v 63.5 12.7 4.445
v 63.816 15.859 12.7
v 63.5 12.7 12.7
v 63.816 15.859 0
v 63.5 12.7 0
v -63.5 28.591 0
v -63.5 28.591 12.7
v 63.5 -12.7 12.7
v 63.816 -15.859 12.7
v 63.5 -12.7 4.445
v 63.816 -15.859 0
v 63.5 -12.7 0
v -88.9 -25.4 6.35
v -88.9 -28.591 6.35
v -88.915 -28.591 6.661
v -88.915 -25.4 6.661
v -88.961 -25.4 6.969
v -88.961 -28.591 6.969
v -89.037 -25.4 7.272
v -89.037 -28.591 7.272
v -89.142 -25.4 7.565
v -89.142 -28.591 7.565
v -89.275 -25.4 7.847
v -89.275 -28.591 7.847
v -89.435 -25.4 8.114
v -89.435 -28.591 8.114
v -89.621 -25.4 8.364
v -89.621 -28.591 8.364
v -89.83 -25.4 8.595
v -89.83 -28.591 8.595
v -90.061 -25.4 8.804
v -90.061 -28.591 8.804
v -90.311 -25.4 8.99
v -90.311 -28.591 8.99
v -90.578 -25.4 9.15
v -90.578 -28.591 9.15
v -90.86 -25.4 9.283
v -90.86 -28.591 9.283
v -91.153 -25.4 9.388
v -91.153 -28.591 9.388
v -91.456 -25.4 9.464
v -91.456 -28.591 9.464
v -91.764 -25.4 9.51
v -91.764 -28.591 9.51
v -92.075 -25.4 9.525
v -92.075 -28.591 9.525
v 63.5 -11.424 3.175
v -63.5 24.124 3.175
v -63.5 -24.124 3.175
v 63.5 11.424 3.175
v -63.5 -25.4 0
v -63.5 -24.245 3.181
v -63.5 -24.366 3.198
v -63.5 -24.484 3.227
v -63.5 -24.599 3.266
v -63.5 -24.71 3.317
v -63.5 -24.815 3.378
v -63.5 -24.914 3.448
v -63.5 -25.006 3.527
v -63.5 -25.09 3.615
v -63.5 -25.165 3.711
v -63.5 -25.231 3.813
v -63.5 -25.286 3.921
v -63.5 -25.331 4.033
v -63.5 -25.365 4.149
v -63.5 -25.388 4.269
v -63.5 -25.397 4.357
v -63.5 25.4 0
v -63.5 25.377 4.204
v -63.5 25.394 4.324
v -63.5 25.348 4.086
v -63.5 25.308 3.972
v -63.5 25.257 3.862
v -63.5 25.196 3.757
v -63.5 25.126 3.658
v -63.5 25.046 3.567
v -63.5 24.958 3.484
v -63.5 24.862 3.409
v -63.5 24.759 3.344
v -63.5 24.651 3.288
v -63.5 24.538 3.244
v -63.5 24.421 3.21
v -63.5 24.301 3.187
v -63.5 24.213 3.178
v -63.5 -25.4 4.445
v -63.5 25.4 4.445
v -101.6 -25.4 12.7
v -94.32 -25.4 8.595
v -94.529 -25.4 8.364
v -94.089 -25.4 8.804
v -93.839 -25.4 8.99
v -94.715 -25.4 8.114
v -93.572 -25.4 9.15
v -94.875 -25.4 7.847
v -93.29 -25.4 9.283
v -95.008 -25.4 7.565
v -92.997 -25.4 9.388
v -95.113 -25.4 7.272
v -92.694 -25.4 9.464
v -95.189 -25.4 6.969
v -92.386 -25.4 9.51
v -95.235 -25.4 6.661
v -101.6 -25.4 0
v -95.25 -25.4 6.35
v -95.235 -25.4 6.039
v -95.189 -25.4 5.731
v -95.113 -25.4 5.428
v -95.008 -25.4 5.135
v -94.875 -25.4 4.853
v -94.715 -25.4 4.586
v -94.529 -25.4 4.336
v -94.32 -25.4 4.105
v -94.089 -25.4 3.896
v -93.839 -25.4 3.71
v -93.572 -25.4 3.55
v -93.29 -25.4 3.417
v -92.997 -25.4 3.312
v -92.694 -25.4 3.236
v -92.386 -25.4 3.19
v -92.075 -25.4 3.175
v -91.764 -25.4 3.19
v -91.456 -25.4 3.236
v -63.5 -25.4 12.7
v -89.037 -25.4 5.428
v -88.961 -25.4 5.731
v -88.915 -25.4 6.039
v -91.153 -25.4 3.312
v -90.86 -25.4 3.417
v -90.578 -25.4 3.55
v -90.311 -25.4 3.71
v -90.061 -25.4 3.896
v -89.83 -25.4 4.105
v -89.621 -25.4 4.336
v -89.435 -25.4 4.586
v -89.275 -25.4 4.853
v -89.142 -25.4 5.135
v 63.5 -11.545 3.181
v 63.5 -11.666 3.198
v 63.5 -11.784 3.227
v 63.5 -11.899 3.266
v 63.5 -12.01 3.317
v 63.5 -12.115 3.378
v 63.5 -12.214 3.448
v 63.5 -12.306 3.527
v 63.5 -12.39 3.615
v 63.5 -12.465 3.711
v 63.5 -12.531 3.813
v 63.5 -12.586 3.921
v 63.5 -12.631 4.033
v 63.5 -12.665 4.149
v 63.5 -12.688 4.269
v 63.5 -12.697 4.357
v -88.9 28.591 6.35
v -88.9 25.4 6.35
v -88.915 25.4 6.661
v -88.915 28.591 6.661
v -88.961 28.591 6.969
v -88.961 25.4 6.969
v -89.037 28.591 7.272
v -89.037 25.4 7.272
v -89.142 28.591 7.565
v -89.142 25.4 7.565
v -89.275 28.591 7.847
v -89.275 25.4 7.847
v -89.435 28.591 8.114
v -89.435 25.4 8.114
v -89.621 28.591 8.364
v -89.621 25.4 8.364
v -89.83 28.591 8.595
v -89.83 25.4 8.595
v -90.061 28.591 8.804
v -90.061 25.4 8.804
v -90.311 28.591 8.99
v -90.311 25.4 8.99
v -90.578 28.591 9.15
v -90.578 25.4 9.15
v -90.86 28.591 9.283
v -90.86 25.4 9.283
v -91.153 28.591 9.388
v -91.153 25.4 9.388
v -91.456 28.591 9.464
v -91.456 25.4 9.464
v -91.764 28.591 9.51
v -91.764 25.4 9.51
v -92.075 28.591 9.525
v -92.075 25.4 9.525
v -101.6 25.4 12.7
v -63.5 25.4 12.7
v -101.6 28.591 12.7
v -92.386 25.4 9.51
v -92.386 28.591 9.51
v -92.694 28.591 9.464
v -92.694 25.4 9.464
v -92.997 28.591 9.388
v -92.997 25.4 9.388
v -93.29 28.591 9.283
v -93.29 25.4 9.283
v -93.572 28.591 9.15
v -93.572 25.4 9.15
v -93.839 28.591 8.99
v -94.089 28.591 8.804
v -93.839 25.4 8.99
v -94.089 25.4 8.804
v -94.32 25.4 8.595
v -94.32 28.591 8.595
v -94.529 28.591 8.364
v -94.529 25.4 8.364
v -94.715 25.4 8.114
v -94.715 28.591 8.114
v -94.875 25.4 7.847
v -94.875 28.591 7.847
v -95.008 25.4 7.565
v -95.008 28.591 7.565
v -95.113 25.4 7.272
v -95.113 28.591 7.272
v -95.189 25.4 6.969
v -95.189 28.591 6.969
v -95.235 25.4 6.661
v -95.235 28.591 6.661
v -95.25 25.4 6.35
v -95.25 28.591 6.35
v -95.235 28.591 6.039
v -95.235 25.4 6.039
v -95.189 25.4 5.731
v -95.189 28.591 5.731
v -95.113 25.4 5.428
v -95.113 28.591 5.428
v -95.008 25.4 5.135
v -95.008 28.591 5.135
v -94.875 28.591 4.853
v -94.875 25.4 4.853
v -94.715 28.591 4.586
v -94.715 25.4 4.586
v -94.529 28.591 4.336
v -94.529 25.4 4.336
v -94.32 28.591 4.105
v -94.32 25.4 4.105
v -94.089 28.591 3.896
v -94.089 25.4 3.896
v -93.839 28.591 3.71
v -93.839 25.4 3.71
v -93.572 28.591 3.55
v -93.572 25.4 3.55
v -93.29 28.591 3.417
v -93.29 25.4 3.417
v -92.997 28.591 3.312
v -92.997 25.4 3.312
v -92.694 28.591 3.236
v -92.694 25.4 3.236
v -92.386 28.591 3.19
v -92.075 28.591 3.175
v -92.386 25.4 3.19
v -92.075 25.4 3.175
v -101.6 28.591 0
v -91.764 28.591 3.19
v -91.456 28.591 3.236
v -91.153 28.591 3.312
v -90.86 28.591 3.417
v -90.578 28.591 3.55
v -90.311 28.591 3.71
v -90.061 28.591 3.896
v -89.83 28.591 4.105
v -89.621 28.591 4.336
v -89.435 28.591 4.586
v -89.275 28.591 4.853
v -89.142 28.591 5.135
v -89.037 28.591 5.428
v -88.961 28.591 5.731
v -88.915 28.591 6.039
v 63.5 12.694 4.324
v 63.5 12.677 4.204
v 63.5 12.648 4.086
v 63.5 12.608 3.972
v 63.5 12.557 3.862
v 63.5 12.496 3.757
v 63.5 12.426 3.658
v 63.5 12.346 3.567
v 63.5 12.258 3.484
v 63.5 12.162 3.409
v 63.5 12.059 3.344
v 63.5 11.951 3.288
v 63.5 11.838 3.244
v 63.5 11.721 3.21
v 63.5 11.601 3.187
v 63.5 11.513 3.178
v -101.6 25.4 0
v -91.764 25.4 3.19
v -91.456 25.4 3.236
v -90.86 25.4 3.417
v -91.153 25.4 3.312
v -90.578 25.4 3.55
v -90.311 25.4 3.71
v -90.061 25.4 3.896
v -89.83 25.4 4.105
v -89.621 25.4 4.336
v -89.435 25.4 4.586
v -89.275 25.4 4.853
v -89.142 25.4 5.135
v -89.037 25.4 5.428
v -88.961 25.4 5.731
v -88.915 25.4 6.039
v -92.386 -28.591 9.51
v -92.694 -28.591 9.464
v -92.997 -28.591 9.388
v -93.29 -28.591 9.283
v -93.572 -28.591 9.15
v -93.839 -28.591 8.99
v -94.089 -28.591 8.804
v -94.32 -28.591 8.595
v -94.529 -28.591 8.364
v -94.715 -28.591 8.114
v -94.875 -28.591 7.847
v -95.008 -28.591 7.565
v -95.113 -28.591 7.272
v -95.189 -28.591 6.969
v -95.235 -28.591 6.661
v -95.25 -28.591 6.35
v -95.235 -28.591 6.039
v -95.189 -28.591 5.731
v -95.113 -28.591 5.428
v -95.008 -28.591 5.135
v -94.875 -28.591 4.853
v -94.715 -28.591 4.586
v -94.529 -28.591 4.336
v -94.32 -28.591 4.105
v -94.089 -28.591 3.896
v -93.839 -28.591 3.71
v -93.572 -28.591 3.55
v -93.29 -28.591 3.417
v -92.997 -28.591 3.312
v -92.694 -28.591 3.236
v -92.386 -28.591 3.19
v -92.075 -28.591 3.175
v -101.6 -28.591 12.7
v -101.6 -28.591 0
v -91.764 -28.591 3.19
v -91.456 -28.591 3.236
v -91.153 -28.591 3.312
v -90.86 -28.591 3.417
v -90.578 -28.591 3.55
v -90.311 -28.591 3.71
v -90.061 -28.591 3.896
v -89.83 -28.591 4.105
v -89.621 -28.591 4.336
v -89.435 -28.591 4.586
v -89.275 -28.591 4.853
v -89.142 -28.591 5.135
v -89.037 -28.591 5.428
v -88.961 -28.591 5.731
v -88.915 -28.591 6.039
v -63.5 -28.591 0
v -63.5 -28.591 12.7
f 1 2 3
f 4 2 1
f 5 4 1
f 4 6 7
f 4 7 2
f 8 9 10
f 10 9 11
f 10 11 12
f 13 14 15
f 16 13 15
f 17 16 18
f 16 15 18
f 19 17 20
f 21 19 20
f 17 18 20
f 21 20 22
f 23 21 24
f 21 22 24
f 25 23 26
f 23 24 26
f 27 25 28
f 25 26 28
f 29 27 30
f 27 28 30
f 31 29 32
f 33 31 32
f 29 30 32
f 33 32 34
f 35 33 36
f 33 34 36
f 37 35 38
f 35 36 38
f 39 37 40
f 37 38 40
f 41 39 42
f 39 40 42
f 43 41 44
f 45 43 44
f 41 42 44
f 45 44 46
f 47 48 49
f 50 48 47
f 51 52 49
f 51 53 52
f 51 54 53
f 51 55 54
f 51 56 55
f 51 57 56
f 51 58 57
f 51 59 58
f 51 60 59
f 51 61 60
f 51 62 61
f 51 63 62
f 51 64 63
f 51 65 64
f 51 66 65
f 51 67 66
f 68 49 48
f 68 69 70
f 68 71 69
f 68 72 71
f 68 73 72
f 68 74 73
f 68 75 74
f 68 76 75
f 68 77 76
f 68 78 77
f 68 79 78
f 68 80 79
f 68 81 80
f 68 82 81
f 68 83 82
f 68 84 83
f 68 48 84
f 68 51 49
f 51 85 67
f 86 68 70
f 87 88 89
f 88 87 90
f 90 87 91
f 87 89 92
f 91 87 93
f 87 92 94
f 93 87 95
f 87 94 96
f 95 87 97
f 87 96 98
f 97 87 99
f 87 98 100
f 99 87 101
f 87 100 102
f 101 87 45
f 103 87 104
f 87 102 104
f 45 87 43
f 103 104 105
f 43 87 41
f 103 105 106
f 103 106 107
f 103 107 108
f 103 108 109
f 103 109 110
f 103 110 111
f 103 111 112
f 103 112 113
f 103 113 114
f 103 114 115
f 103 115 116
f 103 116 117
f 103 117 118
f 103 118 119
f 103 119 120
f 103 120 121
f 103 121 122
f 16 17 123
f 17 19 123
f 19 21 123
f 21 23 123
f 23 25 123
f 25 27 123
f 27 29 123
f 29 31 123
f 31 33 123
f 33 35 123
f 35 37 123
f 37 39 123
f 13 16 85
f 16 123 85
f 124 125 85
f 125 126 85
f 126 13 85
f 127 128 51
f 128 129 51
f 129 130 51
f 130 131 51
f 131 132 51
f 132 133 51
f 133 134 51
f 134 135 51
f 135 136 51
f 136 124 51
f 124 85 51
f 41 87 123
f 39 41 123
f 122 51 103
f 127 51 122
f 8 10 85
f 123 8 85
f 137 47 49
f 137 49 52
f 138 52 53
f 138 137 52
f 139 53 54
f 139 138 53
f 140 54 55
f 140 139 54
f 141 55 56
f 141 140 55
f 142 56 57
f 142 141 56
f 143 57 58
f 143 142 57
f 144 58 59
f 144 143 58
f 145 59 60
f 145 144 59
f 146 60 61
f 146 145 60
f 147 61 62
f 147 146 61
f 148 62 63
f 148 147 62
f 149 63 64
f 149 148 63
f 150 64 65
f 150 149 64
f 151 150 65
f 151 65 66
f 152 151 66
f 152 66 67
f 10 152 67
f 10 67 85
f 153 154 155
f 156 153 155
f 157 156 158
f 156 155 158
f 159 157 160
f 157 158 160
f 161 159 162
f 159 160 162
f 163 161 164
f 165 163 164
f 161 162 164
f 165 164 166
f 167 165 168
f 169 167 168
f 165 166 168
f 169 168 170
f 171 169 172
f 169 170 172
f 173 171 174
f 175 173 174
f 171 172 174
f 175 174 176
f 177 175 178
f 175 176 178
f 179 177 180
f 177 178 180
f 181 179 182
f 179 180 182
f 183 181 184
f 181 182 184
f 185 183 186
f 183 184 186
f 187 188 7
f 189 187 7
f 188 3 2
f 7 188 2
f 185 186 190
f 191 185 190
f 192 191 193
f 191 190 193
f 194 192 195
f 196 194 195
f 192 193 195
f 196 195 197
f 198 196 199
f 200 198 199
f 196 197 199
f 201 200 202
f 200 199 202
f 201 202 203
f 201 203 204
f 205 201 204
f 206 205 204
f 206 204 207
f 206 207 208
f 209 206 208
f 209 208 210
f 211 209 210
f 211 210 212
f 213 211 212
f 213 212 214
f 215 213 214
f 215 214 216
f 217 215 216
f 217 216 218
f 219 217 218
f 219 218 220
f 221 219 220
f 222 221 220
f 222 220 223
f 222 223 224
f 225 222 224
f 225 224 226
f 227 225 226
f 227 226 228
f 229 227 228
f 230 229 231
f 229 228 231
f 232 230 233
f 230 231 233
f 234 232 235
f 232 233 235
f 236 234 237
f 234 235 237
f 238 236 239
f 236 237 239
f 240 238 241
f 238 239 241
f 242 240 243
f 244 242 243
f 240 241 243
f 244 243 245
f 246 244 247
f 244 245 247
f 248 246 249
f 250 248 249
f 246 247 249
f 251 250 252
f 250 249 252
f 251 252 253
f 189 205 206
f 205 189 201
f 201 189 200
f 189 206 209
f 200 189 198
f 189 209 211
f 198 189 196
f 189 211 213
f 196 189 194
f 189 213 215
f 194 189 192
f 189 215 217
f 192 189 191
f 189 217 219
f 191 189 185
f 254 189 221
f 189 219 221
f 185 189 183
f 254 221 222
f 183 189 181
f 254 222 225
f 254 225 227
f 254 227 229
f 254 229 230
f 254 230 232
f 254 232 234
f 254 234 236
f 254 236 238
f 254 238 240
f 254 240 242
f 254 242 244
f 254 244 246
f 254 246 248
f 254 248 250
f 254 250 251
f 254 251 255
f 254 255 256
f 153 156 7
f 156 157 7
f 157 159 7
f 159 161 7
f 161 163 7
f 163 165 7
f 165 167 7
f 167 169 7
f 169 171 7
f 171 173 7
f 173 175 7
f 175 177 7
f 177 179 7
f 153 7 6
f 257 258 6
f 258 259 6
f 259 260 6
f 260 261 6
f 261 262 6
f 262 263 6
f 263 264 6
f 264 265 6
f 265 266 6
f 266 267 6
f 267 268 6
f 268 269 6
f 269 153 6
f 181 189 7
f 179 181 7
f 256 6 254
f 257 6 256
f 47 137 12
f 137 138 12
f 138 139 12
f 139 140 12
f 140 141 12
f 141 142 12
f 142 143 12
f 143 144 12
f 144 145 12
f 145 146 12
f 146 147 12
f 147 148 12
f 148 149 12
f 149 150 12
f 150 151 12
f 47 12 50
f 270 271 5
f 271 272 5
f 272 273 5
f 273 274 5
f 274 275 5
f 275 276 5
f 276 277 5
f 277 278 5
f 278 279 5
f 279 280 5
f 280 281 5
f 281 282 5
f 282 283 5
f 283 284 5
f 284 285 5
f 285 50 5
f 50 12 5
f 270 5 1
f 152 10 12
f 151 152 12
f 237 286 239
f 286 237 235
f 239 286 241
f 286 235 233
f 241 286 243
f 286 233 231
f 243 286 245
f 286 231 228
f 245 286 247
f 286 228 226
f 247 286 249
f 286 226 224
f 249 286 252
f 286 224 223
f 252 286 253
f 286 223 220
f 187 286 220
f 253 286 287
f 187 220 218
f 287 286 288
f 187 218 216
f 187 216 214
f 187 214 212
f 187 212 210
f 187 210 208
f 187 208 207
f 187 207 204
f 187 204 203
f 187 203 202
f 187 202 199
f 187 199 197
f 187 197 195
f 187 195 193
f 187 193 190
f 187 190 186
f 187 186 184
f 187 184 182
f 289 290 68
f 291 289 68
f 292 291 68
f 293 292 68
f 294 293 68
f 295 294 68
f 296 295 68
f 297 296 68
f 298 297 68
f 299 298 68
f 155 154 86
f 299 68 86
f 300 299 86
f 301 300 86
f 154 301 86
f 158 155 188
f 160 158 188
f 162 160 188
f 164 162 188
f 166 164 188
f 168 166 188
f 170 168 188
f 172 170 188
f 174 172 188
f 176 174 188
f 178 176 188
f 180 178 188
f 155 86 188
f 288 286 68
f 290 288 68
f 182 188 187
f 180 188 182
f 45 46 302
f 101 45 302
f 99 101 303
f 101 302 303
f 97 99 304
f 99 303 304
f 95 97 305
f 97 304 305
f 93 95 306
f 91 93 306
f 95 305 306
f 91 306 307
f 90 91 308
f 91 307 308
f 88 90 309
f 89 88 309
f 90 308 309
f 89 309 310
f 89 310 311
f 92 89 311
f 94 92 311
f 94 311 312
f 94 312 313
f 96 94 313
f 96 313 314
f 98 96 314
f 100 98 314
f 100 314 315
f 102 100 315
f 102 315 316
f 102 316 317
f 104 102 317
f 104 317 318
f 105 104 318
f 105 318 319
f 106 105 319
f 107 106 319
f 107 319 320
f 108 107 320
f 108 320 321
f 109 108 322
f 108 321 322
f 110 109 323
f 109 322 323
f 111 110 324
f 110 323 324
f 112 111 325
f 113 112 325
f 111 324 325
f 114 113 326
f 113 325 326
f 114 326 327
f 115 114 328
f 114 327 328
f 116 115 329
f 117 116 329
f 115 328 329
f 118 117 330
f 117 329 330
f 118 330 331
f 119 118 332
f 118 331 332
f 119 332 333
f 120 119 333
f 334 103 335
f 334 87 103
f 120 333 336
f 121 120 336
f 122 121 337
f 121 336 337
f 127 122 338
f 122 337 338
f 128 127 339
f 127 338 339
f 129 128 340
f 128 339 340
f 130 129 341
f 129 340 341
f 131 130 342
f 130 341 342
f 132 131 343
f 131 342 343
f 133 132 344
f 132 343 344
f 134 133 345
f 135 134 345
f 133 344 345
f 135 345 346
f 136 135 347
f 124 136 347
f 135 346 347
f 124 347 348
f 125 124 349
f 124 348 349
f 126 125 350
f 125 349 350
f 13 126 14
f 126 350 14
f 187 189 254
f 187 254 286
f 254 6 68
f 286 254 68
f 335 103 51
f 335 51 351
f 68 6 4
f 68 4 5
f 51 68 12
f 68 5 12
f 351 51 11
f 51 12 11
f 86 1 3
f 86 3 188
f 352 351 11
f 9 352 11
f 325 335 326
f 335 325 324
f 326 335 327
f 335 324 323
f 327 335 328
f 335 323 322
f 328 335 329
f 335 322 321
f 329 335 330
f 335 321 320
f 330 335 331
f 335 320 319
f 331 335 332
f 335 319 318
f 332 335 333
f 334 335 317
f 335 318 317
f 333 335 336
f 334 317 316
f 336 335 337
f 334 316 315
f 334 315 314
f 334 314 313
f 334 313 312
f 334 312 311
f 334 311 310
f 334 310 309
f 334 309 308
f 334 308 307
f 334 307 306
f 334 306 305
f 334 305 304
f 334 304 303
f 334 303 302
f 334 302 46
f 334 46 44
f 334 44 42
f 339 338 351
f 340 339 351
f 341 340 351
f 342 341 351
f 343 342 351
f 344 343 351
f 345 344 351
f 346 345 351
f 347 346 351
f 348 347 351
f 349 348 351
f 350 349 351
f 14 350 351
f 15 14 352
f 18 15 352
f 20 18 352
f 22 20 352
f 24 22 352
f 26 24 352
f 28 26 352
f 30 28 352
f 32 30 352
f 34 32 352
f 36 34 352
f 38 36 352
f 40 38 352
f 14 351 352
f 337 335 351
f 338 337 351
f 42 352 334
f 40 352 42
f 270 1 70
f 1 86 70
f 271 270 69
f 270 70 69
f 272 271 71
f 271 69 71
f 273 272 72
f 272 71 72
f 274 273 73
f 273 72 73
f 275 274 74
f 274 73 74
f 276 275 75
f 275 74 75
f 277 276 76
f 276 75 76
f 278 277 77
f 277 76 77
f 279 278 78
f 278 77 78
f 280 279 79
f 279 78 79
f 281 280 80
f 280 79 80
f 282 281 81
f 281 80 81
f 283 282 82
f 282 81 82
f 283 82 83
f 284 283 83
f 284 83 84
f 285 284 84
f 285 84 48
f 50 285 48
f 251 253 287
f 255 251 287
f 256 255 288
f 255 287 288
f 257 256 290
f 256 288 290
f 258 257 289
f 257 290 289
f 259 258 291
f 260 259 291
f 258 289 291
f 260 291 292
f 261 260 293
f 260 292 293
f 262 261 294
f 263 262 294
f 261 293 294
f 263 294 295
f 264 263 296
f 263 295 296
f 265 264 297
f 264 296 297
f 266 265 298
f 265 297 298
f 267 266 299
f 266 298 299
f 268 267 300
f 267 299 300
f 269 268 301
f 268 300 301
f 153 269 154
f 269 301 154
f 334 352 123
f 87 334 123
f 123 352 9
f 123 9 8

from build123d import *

# Parameters (mm, degrees)
F1_DEPTH = 3.175
F3_DEPTH = 12.7
F5_R     = 1.27
F7_DEPTH = 38.1
F9_DEPTH = 57.1826710194


# Not quite as in the source:
# - a length typed as a fraction of an inch, garbled in the dataset ("3 / 203.2 mm" for 3/8 in), is restored


with BuildPart() as f1:
    # F0 (on Top) → F1 (new body)
    with BuildSketch(Plane.XY):
        Polygon((-63.5, -25.4), (63.5, -12.7), (63.5, 12.7), (-63.5, 25.4), align=None)
    extrude(amount=F1_DEPTH)

    # F2 (on Top) → F3 (join)
    with BuildSketch(Plane.XY):
        Polygon((-63.5, -25.4), (-63.5, -28.5908355097), (63.8159243079, -15.8592430789), (63.5, -12.7), align=None)
    extrude(amount=F3_DEPTH)

    # F4: F1 across plane


with BuildPart() as f1_1:
    add(f1.part)
    add(f1.part.mirror(Plane.XZ))

    # F5
    f5_edges = [f1_1.edges().sort_by_distance(p)[0] for p in [
        (0, -19.05, 3.175),
        (0, 19.05, 3.175),
    ]]
    fillet(f5_edges, radius=F5_R)

    # F6 (on face) → F7 (join)
    with BuildSketch(Plane(origin=(-63.5, 0, 0), x_dir=(0, -1, 0), z_dir=(-1, 0, 0))):
        Polygon((-25.4, 12.7), (-28.5908355097, 12.7), (-28.5908355097, 0), (-25.4, 0), (-25.4, 4.445), align=None)
        Polygon((25.4, 4.445), (25.4, 0), (28.5908355097, 0), (28.5908355097, 12.7), (25.4, 12.7), align=None)
    extrude(amount=F7_DEPTH)

    # F8 (on face) → F9 (cut, through all)
    with BuildSketch(Plane.XZ.offset(28.5908355097)):
        with BuildLine():
            Line((-92.075, 3.175), (-92.075, 9.525))
            ThreePointArc((-92.075, 9.525), (-95.25, 6.35), (-92.075, 3.175))
        make_face()
        with BuildLine():
            ThreePointArc((-88.9, 6.35), (-89.8299359697, 8.5950640303), (-92.075, 9.525))
            Line((-92.075, 9.525), (-92.075, 3.175))
            ThreePointArc((-92.075, 3.175), (-89.8299359697, 4.1049359697), (-88.9, 6.35))
        make_face()
    extrude(amount=-F9_DEPTH, mode=Mode.SUBTRACT)


solid = f1_1.part
